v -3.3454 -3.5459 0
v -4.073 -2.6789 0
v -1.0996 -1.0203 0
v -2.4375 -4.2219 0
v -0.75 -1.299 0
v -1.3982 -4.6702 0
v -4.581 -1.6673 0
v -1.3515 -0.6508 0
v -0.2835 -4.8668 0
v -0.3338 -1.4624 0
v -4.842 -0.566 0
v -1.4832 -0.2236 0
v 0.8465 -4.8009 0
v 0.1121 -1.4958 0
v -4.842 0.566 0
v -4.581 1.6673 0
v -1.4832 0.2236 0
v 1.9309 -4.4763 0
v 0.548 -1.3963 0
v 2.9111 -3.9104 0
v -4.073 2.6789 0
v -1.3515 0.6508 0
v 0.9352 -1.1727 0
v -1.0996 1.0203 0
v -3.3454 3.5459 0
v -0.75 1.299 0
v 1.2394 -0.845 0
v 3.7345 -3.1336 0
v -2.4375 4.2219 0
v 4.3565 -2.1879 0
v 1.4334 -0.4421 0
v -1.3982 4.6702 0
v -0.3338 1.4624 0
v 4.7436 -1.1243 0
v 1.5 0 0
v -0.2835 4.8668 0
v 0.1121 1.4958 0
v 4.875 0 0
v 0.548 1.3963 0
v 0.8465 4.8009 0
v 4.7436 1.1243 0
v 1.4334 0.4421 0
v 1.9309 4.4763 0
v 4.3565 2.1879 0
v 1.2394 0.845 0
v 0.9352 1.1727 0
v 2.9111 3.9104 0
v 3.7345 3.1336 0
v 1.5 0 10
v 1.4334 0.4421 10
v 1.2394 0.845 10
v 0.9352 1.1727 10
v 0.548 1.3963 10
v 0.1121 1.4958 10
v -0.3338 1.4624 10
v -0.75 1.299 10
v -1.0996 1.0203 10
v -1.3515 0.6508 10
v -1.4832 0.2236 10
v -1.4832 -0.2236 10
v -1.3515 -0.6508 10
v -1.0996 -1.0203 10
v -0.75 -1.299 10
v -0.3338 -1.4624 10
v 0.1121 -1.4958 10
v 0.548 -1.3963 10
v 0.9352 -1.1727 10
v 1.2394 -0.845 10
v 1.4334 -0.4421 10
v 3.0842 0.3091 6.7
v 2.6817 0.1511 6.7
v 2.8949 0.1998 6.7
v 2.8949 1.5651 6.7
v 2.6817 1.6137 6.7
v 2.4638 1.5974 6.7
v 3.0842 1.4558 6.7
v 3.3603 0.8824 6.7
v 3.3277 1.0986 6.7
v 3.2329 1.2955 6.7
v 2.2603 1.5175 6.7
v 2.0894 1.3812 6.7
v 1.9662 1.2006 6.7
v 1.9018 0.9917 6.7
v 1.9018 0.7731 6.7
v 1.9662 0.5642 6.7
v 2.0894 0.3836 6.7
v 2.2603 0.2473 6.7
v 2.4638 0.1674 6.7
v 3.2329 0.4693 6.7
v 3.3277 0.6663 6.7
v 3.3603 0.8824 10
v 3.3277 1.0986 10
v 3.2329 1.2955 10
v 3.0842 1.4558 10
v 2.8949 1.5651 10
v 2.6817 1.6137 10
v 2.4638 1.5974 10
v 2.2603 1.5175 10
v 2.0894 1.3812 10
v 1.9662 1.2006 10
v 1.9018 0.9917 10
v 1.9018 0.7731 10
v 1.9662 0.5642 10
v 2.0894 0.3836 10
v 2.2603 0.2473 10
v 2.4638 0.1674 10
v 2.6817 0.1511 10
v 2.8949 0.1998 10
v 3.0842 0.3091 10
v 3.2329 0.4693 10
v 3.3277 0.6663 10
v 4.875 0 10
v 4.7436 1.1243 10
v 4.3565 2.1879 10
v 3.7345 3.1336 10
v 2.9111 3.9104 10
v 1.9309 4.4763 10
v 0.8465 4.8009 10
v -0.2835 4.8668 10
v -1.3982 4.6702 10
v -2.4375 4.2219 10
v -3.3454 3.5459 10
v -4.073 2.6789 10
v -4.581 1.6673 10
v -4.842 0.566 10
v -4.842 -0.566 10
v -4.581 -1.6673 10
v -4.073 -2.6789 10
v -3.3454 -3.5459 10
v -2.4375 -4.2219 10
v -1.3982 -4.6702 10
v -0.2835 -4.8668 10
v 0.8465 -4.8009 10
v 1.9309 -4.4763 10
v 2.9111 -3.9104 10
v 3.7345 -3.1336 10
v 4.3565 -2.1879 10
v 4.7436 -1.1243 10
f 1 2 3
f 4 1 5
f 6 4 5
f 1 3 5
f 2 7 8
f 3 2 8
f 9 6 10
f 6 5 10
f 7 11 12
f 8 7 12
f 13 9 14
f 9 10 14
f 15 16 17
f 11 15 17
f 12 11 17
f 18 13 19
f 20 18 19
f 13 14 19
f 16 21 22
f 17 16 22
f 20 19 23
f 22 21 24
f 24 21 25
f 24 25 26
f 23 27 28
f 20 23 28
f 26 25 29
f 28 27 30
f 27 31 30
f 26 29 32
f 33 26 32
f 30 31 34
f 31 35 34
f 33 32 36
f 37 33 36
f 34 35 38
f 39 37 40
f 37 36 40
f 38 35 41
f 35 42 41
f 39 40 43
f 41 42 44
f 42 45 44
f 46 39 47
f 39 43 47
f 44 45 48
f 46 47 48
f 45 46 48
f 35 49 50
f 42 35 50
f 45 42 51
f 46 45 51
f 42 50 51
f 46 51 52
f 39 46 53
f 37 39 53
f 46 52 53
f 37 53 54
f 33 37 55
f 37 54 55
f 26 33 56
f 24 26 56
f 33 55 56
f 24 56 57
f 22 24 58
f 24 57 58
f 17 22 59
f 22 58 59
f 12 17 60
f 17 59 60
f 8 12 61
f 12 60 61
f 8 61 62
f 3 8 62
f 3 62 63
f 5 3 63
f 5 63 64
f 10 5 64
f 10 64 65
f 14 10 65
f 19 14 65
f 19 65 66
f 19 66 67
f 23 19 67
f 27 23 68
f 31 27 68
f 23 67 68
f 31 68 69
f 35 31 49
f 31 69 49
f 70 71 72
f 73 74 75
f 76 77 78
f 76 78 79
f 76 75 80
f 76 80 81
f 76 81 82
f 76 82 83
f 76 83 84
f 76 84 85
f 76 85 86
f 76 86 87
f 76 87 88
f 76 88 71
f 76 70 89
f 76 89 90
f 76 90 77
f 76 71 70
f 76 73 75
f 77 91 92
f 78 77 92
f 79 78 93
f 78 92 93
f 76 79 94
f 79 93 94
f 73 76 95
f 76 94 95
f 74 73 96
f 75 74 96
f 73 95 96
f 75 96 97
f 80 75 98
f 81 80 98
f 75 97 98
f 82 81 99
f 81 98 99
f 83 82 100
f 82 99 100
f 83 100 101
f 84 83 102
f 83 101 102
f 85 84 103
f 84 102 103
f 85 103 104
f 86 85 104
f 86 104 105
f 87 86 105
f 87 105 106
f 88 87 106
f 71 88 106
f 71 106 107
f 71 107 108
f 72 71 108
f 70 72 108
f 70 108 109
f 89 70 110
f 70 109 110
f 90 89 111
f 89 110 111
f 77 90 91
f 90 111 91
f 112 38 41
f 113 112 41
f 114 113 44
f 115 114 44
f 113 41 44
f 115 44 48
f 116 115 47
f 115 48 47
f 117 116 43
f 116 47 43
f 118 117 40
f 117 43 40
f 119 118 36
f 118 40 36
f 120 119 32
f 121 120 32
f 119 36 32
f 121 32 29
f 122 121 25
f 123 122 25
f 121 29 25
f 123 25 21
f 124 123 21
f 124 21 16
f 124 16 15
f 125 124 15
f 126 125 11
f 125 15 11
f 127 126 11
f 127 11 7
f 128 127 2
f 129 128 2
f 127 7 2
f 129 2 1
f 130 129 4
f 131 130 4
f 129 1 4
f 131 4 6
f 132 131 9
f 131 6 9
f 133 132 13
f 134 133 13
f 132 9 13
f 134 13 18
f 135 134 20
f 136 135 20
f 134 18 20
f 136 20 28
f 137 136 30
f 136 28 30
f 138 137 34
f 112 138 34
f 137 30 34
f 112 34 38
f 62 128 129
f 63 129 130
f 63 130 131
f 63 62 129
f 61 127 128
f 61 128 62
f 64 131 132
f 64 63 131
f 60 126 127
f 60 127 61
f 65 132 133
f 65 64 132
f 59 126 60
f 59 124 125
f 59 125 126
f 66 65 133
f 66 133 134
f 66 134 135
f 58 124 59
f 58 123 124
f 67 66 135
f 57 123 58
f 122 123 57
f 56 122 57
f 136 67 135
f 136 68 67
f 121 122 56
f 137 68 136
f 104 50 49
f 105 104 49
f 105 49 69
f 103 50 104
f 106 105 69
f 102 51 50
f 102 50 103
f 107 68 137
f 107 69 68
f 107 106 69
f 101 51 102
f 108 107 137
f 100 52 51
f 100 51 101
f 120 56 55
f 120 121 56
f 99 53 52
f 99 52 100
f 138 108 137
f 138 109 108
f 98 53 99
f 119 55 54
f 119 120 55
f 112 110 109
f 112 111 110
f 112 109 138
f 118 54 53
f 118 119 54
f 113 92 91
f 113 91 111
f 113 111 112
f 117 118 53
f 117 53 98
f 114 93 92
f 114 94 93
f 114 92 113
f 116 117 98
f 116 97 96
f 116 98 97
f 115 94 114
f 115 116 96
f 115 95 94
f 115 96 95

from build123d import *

# Parameters (mm, degrees)
F0_R     = 4.875
F1_DEPTH = 10
F2_R     = 1.5
F3_DEPTH = 10
F4_R     = 0.733358
F5_DEPTH = 3.3


with BuildPart() as f1:
    # F0 (on Top) → F1 (new body)
    with BuildSketch(Plane.XY):
        Circle(F0_R)
    extrude(amount=F1_DEPTH)

    # F2 (on face) → F3 (cut)
    with BuildSketch(Plane.XY.offset(10)):
        Circle(F2_R)
    extrude(amount=-F3_DEPTH, mode=Mode.SUBTRACT)

    # F4 (on face) → F5 (cut)
    with BuildSketch(Plane.XY.offset(10)):
        with Locations((2.626942, 0.882414)):
            Circle(F4_R)
    extrude(amount=-F5_DEPTH, mode=Mode.SUBTRACT)


solid = f1.part
